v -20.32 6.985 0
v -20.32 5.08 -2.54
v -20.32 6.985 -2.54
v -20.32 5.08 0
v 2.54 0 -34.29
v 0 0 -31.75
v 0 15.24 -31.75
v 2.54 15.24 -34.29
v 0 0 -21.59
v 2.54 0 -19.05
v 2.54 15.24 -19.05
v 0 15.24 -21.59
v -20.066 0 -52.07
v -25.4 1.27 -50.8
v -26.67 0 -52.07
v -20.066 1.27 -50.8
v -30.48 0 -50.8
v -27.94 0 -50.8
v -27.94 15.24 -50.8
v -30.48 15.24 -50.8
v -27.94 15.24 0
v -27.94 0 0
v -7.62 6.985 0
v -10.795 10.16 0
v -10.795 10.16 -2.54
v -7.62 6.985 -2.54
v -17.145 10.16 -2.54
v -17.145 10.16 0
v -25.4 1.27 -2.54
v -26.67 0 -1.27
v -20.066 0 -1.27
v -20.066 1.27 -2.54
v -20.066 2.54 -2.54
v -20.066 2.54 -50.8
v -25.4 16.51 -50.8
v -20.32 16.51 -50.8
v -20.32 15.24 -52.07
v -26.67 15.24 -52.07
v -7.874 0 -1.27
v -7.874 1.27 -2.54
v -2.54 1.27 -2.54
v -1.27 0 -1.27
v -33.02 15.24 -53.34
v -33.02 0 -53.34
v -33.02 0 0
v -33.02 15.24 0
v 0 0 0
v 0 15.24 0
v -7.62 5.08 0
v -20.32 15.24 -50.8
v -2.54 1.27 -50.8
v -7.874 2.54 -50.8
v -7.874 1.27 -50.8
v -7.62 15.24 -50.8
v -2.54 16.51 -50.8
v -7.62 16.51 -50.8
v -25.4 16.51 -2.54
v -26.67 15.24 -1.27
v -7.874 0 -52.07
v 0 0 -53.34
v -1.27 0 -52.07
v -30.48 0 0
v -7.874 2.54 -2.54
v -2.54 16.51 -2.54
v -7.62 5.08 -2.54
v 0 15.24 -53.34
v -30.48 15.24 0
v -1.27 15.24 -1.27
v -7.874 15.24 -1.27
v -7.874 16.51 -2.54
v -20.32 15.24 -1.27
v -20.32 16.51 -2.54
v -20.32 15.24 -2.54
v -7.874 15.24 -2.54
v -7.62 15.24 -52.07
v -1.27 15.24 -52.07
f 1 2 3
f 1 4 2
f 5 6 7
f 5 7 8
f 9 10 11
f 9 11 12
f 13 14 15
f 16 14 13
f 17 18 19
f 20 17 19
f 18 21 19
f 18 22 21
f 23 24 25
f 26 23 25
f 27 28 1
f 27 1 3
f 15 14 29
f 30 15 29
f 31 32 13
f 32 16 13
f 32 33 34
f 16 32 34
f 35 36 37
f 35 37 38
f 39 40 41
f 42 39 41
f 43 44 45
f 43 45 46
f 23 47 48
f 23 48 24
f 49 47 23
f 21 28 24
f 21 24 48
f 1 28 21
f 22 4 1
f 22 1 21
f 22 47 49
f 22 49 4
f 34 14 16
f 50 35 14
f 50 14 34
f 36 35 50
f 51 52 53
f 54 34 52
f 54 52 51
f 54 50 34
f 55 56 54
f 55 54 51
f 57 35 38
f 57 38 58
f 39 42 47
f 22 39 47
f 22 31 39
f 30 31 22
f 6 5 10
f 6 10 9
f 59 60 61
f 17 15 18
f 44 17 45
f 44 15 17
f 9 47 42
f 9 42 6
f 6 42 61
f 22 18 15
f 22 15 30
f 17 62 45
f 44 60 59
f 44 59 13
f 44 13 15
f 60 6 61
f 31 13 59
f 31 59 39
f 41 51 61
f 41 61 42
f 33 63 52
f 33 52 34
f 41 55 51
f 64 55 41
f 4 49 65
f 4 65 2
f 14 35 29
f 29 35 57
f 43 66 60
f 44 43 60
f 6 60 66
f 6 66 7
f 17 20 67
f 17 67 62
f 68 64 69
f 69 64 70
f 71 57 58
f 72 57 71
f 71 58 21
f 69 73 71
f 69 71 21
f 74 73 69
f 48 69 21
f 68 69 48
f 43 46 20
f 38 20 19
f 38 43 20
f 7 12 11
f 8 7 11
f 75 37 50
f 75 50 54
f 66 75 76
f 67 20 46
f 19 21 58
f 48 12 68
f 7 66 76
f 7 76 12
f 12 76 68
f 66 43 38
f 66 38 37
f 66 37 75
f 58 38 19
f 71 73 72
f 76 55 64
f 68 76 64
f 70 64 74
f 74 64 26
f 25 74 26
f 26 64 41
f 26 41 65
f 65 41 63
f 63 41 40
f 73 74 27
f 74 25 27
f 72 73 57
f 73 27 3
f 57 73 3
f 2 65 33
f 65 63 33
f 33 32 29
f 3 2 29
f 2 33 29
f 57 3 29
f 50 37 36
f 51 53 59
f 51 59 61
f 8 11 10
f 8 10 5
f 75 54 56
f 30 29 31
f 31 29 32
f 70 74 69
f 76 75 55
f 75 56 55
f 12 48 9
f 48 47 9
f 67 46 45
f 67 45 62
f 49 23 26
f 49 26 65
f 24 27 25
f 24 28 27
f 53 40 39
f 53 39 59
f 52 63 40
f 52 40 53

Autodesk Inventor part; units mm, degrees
ref_plane "YZ Plane" through (0, 0, 0) normal (1, 0, 0) x (0, 1, 0)
ref_plane "XZ Plane" through (0, 0, 0) normal (0, 1, 0) x (-1, 0, 0)
ref_plane "XY Plane" through (0, 0, 0) normal (0, 0, 1) x (1, 0, 0)
sketch "Sketch1" plane through (0, 0, 0) normal (0, 1, 0) x (-1, 0, 0)
  line L0 (0, 0) -> (27.94, 0)
  line L1 (27.94, 0) -> (27.94, -53.34)
  line L2 (27.94, -53.34) -> (0, -53.34)
  line L3 (0, -53.34) -> (0, 0)
  dimension "d0" = 27.94
  dimension "d1" = 53.34
extrude "Extrusion1" add sketch "Sketch1" along normal blind 15.24
shell "Shell1" thickness 2.54 removed faces 1 at (-9.3133, 15.24, -17.78)
sketch "Sketch3" plane through (-27.94, 0, 0) normal (0, 0, 1) x (1, 0, 0)
  line L0 (20.32, 5.08) -> (7.62, 5.08)
  line L1 (7.62, 5.08) -> (7.62, 10.16)
  line L2 (7.62, 10.16) -> (20.32, 10.16)
  line L3 (20.32, 10.16) -> (20.32, 5.08)
  point P0 (27.94, 0)
  dimension "d20" = 5.08
  dimension "d21" = 12.7
  dimension "d22" = 5.08
  dimension "d23" = 7.62
extrude "Extrusion3" cut sketch "Sketch3" against normal blind 2.54
chamfer "Chamfer1" distance 3.175 angle 45 2 edges at (-20.32, 10.16, -1.27) (-7.62, 10.16, -1.27)
sketch "Sketch5" plane through (-25.4, 2.54, -2.54) normal (0, 1, 0) x (1, 0, 0)
  line L0 (0, 0) -> (5.334, 0)
  line L1 (5.334, 0) -> (5.334, 48.26)
  line L2 (5.334, 48.26) -> (0, 48.26)
  line L3 (0, 48.26) -> (0, 0)
  line L4 (0, 48.26) -> (22.86, 48.26) projected
  line L5 (22.86, 0) -> (17.526, 0)
  line L6 (17.526, 0) -> (17.526, 48.26)
  line L7 (17.526, 48.26) -> (22.86, 48.26)
  line L8 (22.86, 48.26) -> (22.86, 0)
  point P0 (25.4, -2.54)
  dimension "d29" = 5.334
  dimension "d30" = 5.334
extrude "Extrusion4" cut sketch "Sketch5" against normal blind 2.54
sketch "Sketch6" plane through (-27.94, 0, -53.34) normal (-1, 0, 0) x (0, 0, 1)
  point P0 (53.34, 0)
sketch "Sketch7" plane through (-27.94, 0, -53.34) normal (-1, 0, 0) x (0, 0, 1)
  line L0 (2.54, 15.24) -> (50.8, 15.24) projected
  line L1 (0, 0) -> (2.54, 0)
  line L2 (2.54, 0) -> (2.54, 15.24)
  line L3 (2.54, 15.24) -> (0, 15.24)
  line L4 (0, 15.24) -> (0, 0)
  point P0 (53.34, 0)
  dimension "d33" = 2.54
extrude "Extrusion5" add sketch "Sketch7" along normal blind 5.08
sketch "Sketch8" plane through (-27.94, 0, -50.8) normal (0, 0, 1) x (1, 0, 0)
  line L0 (-5.08, 15.24) -> (-2.54, 15.24)
  line L1 (-2.54, 15.24) -> (-2.54, 0)
  line L2 (-2.54, 0) -> (-5.08, 0)
  line L3 (-5.08, 0) -> (-5.08, 15.24)
  point P0 (27.94, 0)
  dimension "d36" = 2.54
extrude "Extrusion6" add sketch "Sketch8" along normal up to surface (50.8 mm away)
chamfer "Chamfer2" distance 1.27 angle 45 6 edges at (-2.54, 0, -26.67) (-5.207, 0, -2.54) (-5.207, 0, -50.8) (-22.733, 0, -2.54) (-25.4, 0, -26.67) (-22.733, 0, -50.8)
sketch "Sketch11" plane through (0, 15.24, 0) normal (0, 1, 0) x (1, 0, 0)
  line L0 (-26.67, 52.07) -> (-17.78, 52.07)
  line L1 (-20.32, 1.27) -> (-26.67, 1.27)
  line L2 (-26.67, 1.27) -> (-26.67, 52.07)
  line L3 (-25.4, 2.54) -> (-25.4, 50.8) projected
  line L4 (-2.54, 2.54) -> (-25.4, 2.54) projected
  line L5 (-25.4, 50.8) -> (-2.54, 50.8) projected
  line L6 (-1.27, 52.07) -> (-7.62, 52.07)
  line L7 (-7.874, 1.27) -> (-1.27, 1.27)
  line L8 (-1.27, 1.27) -> (-1.27, 52.07)
  line L9 (-2.54, 50.8) -> (-2.54, 2.54) projected
  line L10 (-7.62, 52.07) -> (-1.27, 52.07)
  line L11 (-1.27, 52.07) -> (-1.27, 50.8)
  line L12 (-1.27, 50.8) -> (-7.62, 50.8)
  line L13 (-7.62, 50.8) -> (-7.62, 52.07)
  line L14 (-2.54, 50.8) -> (-1.27, 50.8)
  line L15 (-1.27, 50.8) -> (-1.27, 1.27)
  line L16 (-1.27, 1.27) -> (-2.54, 1.27)
  line L17 (-2.54, 1.27) -> (-2.54, 50.8)
  line L18 (-2.54, 2.54) -> (-7.874, 2.54)
  line L19 (-7.874, 2.54) -> (-7.874, 1.27)
  line L20 (-7.874, 1.27) -> (-2.54, 1.27)
  line L21 (-2.54, 1.27) -> (-2.54, 2.54)
  line L22 (-26.67, 52.07) -> (-20.32, 52.07)
  line L23 (-20.32, 52.07) -> (-20.32, 50.8)
  line L24 (-20.32, 50.8) -> (-26.67, 50.8)
  line L25 (-26.67, 50.8) -> (-26.67, 52.07)
  line L26 (-25.4, 50.8) -> (-26.67, 50.8)
  line L27 (-26.67, 50.8) -> (-26.67, 1.27)
  line L28 (-26.67, 1.27) -> (-25.4, 1.27)
  line L29 (-25.4, 1.27) -> (-25.4, 50.8)
  line L30 (-25.4, 2.54) -> (-20.32, 2.54)
  line L31 (-20.32, 2.54) -> (-20.32, 1.27)
  line L32 (-20.32, 1.27) -> (-25.4, 1.27)
  line L33 (-25.4, 1.27) -> (-25.4, 2.54)
  point P0 (0, 0)
  dimension "d50" = 1.27
  dimension "d51" = 1.27
  dimension "d52" = 1.27
  dimension "d55" = 1.27
  dimension "d57" = 1.27
  dimension "d58" = 5.08
  dimension "d59" = 48.26
  dimension "d60" = 6.35
  dimension "d61" = 6.35
extrude "Extrusion8" add sketch "Sketch11" along normal blind 1.27 contours L0 L23 L5 L24 L2 | L24 L3 L29 L1 L2 | L13 L6 L8 L12 L5 | L29 L4 L31 L1 | L12 L8 L7 L17 L9 | L17 L7 L19 L4
chamfer "Chamfer3" distance 1.27 angle 45 6 edges at (-1.27, 16.51, -26.67) (-4.572, 16.51, -1.27) (-4.445, 16.51, -52.07) (-23.495, 16.51, -52.07) (-26.67, 16.51, -26.67) (-23.495, 16.51, -1.27)
sketch "Sketch12" plane through (0, 0, 0) normal (1, 0, 0) x (0, 0, -1)
  line L0 (52.07, 0) -> (1.27, 0) projected
  line L1 (0, 15.24) -> (53.34, 15.24) projected
  line L2 (19.05, 0) -> (34.29, 0)
  line L3 (34.29, 0) -> (34.29, 15.24)
  line L4 (34.29, 15.24) -> (19.05, 15.24)
  line L5 (19.05, 15.24) -> (19.05, 0)
  line L6 (0, 0) -> (0, 15.24) projected
  line L7 (53.34, 0) -> (53.34, 15.24) projected
  dimension "d67" = 19.05
  dimension "d68" = 19.05
extrude "Extrusion9" add sketch "Sketch12" along normal blind 2.54
sketch "Sketch14" plane through (0, 0, 0) normal (0, -1, 0) x (1, 0, 0)
  line L0 (0, -19.05) -> (0, -21.59)
  line L1 (2.54, -19.05) -> (0, -21.59)
  line L2 (0, -34.29) -> (0, -31.75)
  line L3 (0, -31.75) -> (2.54, -34.29)
  line L4 (0, -19.05) -> (2.54, -19.05)
  line L5 (0, -19.05) -> (2.54, -19.05) projected
  line L6 (2.54, -34.29) -> (0, -34.29)
  line L7 (0, -53.34) -> (0, -34.29) projected
  point P0 (0, 0)
  dimension "d71" = 2.54
  dimension "d72" = 2.54
extrude "Extrusion10" cut sketch "Sketch14" against normal blind 25.4
properties part number "nano_enclosure_modular"
